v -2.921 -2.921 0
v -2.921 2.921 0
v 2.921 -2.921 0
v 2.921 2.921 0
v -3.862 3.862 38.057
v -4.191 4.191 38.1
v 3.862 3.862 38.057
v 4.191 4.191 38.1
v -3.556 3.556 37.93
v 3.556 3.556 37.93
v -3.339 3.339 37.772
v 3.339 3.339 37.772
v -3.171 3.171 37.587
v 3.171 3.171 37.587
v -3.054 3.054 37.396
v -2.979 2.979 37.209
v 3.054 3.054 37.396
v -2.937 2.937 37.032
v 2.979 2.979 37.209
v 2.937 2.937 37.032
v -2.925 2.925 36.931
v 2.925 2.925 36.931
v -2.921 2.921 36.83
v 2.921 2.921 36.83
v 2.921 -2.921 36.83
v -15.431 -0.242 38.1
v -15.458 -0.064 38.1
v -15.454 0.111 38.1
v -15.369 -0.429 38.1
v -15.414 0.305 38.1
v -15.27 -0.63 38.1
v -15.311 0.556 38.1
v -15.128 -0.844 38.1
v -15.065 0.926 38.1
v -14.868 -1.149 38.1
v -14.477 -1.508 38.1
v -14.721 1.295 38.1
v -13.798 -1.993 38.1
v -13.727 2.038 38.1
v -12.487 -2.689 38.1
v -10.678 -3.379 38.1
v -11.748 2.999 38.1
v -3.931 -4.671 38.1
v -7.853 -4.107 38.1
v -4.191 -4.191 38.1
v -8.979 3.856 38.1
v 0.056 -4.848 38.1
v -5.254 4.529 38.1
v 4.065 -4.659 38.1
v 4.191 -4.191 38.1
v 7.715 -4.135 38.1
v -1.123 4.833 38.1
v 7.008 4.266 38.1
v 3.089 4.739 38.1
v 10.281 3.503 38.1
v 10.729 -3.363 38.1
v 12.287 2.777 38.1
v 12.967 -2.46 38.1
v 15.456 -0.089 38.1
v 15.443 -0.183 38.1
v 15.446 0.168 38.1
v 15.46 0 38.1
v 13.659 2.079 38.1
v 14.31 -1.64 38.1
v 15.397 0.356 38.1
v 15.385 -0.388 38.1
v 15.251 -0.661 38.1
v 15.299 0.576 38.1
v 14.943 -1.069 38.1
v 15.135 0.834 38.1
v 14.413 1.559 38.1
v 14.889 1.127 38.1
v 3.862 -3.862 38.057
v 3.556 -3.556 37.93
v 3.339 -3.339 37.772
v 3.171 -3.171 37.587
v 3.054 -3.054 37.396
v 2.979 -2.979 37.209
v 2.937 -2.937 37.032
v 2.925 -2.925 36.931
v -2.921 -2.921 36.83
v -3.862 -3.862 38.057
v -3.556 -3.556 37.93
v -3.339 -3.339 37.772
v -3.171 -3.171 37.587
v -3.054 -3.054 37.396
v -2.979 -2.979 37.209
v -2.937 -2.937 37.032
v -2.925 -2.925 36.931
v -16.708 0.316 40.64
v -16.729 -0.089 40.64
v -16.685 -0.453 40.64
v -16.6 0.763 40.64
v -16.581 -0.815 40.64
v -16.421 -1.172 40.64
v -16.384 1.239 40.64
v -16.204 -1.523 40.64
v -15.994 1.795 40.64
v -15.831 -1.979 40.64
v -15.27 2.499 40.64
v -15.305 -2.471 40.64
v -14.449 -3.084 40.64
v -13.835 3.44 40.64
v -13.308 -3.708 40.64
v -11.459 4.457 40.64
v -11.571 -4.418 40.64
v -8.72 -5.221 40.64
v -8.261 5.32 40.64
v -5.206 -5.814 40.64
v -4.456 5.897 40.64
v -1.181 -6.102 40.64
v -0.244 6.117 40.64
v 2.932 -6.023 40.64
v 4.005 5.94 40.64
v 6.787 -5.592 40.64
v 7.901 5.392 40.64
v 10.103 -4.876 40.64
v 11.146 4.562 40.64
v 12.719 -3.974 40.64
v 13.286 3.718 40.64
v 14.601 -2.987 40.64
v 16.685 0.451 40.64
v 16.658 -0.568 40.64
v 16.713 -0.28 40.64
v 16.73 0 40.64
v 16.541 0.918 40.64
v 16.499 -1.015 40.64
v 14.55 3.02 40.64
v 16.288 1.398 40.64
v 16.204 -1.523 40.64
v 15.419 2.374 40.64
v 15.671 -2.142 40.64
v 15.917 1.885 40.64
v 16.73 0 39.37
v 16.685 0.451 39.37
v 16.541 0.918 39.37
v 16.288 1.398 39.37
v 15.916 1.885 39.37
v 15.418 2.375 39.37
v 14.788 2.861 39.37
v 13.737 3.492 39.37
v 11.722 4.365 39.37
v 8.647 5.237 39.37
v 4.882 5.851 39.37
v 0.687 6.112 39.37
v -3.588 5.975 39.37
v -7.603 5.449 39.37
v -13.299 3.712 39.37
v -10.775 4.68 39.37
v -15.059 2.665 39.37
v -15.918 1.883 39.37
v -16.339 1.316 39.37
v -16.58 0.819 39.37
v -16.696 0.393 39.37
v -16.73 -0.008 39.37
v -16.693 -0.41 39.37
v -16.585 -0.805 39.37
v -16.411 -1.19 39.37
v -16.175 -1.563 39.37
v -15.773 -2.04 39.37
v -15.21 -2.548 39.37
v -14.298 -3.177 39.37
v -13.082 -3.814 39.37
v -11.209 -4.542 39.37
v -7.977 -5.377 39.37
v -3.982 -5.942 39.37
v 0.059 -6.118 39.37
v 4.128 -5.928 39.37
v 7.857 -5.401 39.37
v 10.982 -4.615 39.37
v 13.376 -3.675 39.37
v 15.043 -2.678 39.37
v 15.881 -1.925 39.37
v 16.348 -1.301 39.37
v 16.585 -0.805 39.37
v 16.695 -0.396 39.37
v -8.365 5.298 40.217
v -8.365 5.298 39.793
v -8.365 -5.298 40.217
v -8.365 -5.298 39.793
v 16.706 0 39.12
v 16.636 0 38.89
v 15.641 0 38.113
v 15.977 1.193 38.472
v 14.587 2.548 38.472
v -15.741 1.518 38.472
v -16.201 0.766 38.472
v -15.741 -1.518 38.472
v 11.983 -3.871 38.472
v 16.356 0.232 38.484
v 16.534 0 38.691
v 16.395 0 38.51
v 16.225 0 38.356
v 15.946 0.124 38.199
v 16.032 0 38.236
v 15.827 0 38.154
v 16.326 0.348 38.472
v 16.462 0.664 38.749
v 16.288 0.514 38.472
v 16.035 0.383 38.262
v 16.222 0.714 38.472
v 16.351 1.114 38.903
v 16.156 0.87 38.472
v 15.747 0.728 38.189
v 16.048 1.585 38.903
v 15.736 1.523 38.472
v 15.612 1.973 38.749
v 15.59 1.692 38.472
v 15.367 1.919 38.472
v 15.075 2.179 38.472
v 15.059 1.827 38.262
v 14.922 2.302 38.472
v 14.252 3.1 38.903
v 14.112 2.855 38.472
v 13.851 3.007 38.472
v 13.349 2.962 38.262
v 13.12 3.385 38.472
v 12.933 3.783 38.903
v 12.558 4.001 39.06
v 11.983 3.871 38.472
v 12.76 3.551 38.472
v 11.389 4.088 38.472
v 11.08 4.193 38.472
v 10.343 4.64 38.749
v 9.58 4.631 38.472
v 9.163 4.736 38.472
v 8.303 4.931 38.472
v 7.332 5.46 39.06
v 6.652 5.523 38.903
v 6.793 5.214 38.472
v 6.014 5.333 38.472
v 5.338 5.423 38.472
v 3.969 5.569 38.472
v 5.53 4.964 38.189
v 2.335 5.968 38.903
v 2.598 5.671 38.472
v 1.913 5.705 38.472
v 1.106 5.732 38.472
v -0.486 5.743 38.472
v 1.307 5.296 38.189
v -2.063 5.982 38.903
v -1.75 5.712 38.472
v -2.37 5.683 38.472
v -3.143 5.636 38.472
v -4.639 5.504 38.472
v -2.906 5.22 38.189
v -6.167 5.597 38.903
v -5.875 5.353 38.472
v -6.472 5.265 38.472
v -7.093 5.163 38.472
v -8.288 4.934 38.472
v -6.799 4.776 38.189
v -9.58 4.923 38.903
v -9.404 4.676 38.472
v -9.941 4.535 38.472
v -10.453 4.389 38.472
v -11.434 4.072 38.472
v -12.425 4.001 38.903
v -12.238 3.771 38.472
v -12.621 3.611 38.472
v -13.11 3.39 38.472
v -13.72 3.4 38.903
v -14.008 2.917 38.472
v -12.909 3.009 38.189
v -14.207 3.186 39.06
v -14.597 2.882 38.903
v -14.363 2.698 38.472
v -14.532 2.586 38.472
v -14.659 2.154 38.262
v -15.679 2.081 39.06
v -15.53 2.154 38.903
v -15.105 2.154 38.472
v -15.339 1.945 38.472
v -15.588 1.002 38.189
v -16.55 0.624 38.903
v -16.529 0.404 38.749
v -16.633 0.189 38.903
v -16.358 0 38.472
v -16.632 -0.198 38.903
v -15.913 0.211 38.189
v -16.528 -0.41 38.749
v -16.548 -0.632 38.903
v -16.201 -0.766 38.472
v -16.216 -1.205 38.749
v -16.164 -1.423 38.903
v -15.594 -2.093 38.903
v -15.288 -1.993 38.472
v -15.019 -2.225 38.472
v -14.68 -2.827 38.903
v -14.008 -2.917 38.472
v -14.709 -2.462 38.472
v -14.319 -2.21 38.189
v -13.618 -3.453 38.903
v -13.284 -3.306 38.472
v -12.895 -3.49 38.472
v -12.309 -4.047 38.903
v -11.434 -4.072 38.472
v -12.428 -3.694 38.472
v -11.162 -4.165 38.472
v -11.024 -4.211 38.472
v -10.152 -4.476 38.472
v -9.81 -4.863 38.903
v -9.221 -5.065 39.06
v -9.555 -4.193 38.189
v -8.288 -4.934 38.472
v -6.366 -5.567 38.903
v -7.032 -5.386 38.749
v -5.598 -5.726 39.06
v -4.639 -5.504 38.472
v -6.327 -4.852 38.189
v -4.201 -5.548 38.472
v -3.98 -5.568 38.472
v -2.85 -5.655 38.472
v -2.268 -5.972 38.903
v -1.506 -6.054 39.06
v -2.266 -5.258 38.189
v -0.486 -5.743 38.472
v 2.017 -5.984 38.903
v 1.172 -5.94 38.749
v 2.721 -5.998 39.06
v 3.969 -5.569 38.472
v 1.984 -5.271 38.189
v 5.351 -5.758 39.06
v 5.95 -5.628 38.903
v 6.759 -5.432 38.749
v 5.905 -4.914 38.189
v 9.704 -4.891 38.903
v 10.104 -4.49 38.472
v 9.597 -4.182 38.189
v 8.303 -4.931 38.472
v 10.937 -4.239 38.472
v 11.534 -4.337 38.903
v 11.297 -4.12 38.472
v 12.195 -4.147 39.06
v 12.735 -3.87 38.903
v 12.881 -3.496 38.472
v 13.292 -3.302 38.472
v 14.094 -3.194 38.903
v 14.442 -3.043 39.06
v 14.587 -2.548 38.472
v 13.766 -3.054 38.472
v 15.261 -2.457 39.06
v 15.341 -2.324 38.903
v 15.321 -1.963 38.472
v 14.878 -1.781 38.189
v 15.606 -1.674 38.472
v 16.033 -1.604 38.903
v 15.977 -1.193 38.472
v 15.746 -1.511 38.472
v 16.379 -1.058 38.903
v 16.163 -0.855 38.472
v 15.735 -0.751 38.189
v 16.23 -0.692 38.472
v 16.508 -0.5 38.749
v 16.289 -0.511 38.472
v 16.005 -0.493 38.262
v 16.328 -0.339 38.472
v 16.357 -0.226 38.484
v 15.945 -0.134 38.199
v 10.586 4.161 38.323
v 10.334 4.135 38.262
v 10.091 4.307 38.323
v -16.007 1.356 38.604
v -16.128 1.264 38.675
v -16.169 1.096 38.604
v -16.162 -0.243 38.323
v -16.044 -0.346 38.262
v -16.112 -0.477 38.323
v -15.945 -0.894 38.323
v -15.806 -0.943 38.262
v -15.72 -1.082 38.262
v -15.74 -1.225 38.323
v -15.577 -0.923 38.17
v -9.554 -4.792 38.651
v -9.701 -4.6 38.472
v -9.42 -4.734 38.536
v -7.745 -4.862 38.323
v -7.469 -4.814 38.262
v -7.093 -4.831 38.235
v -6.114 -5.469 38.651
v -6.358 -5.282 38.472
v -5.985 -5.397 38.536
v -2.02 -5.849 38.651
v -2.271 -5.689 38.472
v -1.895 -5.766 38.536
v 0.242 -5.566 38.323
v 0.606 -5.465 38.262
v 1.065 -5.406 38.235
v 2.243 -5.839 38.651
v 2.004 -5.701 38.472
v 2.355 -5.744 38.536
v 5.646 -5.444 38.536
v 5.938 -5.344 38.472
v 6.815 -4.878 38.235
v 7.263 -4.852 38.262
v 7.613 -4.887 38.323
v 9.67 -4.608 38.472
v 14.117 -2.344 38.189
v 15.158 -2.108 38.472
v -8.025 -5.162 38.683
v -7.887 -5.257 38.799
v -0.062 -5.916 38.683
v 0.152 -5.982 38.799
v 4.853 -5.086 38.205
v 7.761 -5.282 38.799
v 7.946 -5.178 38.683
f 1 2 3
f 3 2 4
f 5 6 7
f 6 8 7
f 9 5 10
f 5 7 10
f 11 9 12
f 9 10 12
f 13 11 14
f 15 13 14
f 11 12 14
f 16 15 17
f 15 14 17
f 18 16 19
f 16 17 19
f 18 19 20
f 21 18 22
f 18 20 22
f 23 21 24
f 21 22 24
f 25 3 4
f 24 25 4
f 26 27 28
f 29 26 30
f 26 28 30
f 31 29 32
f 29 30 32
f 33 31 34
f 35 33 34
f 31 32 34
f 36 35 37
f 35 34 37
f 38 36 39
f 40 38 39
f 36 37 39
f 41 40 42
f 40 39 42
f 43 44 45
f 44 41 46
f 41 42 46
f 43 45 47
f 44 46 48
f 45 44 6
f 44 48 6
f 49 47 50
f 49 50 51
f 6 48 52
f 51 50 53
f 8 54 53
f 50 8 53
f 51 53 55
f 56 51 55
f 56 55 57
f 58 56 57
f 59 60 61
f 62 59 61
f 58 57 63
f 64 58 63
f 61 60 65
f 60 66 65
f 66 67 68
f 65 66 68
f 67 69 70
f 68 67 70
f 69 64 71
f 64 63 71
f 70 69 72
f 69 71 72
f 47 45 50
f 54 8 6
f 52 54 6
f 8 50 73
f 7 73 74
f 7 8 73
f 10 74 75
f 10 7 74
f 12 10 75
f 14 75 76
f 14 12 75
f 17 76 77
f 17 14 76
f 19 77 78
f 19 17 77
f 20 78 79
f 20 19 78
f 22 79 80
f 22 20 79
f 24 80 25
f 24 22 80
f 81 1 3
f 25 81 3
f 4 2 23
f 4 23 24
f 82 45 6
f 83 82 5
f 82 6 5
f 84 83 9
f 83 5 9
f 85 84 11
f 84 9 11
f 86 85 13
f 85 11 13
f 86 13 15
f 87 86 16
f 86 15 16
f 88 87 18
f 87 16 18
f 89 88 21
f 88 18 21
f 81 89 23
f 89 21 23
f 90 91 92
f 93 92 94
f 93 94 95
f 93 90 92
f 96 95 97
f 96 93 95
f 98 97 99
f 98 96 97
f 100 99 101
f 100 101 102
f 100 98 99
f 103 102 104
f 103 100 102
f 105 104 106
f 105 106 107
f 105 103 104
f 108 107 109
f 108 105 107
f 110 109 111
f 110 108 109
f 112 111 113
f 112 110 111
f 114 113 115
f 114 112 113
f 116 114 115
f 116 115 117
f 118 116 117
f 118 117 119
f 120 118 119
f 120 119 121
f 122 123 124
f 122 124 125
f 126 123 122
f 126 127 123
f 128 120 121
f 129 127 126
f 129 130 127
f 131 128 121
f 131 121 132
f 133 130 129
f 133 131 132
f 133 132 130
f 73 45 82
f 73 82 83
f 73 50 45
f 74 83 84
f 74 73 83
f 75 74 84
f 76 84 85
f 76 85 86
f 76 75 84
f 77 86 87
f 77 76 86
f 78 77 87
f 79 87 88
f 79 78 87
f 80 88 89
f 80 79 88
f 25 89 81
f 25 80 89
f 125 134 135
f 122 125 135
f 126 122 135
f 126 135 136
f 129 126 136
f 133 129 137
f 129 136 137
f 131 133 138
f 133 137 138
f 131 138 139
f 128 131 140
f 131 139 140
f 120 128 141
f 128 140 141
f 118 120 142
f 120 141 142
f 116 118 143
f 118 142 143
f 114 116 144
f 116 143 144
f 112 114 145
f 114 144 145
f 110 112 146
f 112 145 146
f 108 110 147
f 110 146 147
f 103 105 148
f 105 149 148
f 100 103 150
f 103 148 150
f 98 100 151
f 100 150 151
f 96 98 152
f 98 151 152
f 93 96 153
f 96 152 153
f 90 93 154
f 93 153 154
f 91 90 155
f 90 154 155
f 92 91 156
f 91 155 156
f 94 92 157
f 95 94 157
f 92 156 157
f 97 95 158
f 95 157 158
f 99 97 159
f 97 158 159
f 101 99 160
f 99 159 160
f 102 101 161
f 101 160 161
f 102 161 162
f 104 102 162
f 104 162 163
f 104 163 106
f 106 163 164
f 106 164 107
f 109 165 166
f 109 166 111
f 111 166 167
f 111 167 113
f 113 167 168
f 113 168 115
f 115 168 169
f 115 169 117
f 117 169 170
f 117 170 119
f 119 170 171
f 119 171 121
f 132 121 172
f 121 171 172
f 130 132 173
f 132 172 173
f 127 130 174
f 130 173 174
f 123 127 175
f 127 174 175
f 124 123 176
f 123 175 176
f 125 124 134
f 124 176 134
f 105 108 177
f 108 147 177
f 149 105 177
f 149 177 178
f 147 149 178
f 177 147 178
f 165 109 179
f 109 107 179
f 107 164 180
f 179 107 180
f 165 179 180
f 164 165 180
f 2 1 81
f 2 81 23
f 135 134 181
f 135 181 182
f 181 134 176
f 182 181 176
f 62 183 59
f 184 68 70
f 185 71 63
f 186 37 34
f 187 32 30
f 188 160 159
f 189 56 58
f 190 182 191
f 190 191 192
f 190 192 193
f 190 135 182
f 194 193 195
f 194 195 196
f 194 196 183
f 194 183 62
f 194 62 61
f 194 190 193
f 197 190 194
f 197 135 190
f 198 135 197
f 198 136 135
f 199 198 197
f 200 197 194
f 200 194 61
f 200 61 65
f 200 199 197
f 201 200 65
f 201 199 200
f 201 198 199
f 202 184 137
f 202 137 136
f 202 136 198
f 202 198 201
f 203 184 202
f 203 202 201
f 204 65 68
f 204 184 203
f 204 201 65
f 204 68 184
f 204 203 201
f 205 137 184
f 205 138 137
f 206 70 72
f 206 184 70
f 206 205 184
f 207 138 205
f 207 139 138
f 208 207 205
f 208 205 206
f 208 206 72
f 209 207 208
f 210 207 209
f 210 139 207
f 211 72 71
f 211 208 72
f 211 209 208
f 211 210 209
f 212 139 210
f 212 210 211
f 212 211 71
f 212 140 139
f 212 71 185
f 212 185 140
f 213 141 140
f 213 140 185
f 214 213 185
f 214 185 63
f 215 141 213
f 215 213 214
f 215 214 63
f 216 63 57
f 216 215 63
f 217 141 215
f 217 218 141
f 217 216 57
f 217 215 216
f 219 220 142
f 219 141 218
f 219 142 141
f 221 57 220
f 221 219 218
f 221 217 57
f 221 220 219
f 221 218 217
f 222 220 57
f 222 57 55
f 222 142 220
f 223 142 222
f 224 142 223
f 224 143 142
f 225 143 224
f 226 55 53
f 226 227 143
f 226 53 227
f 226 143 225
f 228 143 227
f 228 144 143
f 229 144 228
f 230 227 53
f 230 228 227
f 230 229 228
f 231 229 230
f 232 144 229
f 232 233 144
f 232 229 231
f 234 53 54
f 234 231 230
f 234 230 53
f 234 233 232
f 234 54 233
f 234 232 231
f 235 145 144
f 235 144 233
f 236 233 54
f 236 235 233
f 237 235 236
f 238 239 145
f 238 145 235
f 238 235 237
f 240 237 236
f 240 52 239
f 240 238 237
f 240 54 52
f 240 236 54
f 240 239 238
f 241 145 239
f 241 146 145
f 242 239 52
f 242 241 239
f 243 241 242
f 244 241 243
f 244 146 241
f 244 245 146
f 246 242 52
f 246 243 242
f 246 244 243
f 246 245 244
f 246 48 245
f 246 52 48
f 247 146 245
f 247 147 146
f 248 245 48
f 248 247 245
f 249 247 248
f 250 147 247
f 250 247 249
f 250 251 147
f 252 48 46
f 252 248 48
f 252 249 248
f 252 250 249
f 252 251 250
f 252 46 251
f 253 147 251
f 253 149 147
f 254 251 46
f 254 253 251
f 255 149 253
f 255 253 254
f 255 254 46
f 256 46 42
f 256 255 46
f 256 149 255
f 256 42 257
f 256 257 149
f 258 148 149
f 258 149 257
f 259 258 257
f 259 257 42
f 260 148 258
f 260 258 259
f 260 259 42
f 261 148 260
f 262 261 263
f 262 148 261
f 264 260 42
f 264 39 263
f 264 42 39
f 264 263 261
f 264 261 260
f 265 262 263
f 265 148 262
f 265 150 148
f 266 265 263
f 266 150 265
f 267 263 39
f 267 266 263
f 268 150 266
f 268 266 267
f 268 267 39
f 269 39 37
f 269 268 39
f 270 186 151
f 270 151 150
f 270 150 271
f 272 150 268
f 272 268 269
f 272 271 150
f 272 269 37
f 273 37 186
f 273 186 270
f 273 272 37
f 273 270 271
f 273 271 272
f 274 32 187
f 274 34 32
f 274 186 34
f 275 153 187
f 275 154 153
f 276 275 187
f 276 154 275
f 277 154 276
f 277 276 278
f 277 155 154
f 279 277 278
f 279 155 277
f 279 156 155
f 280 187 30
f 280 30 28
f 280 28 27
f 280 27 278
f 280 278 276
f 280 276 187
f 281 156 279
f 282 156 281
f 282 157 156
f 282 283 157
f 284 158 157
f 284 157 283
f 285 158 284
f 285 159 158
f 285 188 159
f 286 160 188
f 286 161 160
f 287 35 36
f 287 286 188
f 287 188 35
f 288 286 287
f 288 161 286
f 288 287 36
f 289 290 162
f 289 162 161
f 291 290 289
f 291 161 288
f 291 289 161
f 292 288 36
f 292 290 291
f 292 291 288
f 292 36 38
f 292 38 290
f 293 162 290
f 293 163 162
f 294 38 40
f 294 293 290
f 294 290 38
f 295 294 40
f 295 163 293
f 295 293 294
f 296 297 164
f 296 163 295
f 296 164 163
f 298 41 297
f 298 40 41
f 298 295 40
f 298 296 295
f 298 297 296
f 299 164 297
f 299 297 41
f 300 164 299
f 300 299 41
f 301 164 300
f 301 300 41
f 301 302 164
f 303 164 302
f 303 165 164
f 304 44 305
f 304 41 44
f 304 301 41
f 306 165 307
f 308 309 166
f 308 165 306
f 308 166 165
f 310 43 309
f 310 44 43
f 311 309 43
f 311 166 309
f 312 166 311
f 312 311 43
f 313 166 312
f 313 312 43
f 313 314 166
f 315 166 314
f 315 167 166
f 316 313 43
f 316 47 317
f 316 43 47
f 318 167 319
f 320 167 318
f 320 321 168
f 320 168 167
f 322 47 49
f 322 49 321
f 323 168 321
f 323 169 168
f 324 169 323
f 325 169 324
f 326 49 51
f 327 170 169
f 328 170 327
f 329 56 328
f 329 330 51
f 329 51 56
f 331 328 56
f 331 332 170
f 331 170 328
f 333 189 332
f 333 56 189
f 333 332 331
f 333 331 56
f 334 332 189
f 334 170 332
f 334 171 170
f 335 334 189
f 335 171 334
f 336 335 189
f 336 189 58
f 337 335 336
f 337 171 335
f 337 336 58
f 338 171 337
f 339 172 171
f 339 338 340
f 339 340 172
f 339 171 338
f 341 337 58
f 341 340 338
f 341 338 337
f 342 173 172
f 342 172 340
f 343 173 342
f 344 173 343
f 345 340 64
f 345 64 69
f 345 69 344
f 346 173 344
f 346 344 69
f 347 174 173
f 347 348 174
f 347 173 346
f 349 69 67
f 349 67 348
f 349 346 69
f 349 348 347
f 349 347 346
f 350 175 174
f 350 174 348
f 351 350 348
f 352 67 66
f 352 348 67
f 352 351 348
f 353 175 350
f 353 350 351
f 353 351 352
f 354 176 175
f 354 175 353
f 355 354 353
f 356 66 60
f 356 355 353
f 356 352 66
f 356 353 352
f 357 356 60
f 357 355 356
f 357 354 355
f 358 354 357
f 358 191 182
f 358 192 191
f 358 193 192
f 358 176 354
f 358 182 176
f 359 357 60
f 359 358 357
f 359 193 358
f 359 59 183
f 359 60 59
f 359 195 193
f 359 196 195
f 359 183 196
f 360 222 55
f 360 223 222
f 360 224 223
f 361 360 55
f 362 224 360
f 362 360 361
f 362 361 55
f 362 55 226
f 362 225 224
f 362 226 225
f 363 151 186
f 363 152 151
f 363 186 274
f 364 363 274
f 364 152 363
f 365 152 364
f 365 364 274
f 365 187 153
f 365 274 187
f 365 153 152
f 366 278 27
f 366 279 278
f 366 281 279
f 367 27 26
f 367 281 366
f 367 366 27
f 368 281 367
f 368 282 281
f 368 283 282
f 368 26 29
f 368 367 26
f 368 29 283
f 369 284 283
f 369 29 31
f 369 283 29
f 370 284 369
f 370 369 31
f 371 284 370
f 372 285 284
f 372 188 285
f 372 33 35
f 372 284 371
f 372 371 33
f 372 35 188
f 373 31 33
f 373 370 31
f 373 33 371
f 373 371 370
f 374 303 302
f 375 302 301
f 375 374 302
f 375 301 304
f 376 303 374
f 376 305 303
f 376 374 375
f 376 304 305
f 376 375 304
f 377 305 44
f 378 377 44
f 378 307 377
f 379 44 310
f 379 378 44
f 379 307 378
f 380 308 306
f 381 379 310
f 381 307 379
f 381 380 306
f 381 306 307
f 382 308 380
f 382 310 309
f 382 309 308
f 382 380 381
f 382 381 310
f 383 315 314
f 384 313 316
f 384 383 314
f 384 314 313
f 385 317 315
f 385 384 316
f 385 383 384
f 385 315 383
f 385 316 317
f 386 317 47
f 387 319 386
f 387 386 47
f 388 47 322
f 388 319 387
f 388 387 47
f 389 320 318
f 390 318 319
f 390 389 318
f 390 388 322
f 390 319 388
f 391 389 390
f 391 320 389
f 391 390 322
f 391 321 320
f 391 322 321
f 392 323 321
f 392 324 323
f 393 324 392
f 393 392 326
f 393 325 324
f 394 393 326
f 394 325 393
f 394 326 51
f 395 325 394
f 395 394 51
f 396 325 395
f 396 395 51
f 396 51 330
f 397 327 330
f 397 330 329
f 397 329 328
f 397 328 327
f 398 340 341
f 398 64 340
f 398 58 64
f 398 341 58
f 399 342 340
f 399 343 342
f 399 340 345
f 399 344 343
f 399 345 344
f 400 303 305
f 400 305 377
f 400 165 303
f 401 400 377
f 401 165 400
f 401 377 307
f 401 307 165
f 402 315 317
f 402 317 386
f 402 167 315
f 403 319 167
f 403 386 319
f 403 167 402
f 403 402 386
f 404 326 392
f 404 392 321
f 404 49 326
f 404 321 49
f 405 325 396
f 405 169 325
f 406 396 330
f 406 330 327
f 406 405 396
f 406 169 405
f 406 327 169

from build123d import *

# Parameters (mm, degrees)
F0_W     = 5.842
F0_H     = 5.842
F1_DEPTH = 38.1
F3_DEPTH = 2.54
F4_R     = 1.27


with BuildPart() as f1:
    # F0 (on Top) → F1 (new body)
    with BuildSketch(Plane.XY):
        Rectangle(F0_W, F0_H)
    extrude(amount=F1_DEPTH)

    # F2 (on face) → F3 (join)
    with BuildSketch(Plane.XY.offset(38.1)):
        with BuildLine():
            add(Edge.make_bspline(
                [(16.730471, 0), (16.730471, 10.595953), (-8.365235, 5.297976), (-33.460941, 0), (-8.365235, -5.297976), (16.730471, -10.595953), (16.730471, 0)],
                knots=[0, 0, 0, 2.094395, 2.094395, 4.18879, 4.18879, 6.283185, 6.283185, 6.283185], degree=2, weights=[1, 0.5, 1, 0.5, 1, 0.5, 1]))
        make_face()
    extrude(amount=F3_DEPTH)

    # F4
    f4_edges = [f1.edges().sort_by_distance(p)[0] for p in [
        (2.921, 0, 38.1),
        (0, -2.921, 38.1),
        (-2.921, 0, 38.1),
        (0, 2.921, 38.1),
        (-16.730471, 4.7e-05, 38.1),
    ]]
    fillet(f4_edges, radius=F4_R)


solid = f1.part
